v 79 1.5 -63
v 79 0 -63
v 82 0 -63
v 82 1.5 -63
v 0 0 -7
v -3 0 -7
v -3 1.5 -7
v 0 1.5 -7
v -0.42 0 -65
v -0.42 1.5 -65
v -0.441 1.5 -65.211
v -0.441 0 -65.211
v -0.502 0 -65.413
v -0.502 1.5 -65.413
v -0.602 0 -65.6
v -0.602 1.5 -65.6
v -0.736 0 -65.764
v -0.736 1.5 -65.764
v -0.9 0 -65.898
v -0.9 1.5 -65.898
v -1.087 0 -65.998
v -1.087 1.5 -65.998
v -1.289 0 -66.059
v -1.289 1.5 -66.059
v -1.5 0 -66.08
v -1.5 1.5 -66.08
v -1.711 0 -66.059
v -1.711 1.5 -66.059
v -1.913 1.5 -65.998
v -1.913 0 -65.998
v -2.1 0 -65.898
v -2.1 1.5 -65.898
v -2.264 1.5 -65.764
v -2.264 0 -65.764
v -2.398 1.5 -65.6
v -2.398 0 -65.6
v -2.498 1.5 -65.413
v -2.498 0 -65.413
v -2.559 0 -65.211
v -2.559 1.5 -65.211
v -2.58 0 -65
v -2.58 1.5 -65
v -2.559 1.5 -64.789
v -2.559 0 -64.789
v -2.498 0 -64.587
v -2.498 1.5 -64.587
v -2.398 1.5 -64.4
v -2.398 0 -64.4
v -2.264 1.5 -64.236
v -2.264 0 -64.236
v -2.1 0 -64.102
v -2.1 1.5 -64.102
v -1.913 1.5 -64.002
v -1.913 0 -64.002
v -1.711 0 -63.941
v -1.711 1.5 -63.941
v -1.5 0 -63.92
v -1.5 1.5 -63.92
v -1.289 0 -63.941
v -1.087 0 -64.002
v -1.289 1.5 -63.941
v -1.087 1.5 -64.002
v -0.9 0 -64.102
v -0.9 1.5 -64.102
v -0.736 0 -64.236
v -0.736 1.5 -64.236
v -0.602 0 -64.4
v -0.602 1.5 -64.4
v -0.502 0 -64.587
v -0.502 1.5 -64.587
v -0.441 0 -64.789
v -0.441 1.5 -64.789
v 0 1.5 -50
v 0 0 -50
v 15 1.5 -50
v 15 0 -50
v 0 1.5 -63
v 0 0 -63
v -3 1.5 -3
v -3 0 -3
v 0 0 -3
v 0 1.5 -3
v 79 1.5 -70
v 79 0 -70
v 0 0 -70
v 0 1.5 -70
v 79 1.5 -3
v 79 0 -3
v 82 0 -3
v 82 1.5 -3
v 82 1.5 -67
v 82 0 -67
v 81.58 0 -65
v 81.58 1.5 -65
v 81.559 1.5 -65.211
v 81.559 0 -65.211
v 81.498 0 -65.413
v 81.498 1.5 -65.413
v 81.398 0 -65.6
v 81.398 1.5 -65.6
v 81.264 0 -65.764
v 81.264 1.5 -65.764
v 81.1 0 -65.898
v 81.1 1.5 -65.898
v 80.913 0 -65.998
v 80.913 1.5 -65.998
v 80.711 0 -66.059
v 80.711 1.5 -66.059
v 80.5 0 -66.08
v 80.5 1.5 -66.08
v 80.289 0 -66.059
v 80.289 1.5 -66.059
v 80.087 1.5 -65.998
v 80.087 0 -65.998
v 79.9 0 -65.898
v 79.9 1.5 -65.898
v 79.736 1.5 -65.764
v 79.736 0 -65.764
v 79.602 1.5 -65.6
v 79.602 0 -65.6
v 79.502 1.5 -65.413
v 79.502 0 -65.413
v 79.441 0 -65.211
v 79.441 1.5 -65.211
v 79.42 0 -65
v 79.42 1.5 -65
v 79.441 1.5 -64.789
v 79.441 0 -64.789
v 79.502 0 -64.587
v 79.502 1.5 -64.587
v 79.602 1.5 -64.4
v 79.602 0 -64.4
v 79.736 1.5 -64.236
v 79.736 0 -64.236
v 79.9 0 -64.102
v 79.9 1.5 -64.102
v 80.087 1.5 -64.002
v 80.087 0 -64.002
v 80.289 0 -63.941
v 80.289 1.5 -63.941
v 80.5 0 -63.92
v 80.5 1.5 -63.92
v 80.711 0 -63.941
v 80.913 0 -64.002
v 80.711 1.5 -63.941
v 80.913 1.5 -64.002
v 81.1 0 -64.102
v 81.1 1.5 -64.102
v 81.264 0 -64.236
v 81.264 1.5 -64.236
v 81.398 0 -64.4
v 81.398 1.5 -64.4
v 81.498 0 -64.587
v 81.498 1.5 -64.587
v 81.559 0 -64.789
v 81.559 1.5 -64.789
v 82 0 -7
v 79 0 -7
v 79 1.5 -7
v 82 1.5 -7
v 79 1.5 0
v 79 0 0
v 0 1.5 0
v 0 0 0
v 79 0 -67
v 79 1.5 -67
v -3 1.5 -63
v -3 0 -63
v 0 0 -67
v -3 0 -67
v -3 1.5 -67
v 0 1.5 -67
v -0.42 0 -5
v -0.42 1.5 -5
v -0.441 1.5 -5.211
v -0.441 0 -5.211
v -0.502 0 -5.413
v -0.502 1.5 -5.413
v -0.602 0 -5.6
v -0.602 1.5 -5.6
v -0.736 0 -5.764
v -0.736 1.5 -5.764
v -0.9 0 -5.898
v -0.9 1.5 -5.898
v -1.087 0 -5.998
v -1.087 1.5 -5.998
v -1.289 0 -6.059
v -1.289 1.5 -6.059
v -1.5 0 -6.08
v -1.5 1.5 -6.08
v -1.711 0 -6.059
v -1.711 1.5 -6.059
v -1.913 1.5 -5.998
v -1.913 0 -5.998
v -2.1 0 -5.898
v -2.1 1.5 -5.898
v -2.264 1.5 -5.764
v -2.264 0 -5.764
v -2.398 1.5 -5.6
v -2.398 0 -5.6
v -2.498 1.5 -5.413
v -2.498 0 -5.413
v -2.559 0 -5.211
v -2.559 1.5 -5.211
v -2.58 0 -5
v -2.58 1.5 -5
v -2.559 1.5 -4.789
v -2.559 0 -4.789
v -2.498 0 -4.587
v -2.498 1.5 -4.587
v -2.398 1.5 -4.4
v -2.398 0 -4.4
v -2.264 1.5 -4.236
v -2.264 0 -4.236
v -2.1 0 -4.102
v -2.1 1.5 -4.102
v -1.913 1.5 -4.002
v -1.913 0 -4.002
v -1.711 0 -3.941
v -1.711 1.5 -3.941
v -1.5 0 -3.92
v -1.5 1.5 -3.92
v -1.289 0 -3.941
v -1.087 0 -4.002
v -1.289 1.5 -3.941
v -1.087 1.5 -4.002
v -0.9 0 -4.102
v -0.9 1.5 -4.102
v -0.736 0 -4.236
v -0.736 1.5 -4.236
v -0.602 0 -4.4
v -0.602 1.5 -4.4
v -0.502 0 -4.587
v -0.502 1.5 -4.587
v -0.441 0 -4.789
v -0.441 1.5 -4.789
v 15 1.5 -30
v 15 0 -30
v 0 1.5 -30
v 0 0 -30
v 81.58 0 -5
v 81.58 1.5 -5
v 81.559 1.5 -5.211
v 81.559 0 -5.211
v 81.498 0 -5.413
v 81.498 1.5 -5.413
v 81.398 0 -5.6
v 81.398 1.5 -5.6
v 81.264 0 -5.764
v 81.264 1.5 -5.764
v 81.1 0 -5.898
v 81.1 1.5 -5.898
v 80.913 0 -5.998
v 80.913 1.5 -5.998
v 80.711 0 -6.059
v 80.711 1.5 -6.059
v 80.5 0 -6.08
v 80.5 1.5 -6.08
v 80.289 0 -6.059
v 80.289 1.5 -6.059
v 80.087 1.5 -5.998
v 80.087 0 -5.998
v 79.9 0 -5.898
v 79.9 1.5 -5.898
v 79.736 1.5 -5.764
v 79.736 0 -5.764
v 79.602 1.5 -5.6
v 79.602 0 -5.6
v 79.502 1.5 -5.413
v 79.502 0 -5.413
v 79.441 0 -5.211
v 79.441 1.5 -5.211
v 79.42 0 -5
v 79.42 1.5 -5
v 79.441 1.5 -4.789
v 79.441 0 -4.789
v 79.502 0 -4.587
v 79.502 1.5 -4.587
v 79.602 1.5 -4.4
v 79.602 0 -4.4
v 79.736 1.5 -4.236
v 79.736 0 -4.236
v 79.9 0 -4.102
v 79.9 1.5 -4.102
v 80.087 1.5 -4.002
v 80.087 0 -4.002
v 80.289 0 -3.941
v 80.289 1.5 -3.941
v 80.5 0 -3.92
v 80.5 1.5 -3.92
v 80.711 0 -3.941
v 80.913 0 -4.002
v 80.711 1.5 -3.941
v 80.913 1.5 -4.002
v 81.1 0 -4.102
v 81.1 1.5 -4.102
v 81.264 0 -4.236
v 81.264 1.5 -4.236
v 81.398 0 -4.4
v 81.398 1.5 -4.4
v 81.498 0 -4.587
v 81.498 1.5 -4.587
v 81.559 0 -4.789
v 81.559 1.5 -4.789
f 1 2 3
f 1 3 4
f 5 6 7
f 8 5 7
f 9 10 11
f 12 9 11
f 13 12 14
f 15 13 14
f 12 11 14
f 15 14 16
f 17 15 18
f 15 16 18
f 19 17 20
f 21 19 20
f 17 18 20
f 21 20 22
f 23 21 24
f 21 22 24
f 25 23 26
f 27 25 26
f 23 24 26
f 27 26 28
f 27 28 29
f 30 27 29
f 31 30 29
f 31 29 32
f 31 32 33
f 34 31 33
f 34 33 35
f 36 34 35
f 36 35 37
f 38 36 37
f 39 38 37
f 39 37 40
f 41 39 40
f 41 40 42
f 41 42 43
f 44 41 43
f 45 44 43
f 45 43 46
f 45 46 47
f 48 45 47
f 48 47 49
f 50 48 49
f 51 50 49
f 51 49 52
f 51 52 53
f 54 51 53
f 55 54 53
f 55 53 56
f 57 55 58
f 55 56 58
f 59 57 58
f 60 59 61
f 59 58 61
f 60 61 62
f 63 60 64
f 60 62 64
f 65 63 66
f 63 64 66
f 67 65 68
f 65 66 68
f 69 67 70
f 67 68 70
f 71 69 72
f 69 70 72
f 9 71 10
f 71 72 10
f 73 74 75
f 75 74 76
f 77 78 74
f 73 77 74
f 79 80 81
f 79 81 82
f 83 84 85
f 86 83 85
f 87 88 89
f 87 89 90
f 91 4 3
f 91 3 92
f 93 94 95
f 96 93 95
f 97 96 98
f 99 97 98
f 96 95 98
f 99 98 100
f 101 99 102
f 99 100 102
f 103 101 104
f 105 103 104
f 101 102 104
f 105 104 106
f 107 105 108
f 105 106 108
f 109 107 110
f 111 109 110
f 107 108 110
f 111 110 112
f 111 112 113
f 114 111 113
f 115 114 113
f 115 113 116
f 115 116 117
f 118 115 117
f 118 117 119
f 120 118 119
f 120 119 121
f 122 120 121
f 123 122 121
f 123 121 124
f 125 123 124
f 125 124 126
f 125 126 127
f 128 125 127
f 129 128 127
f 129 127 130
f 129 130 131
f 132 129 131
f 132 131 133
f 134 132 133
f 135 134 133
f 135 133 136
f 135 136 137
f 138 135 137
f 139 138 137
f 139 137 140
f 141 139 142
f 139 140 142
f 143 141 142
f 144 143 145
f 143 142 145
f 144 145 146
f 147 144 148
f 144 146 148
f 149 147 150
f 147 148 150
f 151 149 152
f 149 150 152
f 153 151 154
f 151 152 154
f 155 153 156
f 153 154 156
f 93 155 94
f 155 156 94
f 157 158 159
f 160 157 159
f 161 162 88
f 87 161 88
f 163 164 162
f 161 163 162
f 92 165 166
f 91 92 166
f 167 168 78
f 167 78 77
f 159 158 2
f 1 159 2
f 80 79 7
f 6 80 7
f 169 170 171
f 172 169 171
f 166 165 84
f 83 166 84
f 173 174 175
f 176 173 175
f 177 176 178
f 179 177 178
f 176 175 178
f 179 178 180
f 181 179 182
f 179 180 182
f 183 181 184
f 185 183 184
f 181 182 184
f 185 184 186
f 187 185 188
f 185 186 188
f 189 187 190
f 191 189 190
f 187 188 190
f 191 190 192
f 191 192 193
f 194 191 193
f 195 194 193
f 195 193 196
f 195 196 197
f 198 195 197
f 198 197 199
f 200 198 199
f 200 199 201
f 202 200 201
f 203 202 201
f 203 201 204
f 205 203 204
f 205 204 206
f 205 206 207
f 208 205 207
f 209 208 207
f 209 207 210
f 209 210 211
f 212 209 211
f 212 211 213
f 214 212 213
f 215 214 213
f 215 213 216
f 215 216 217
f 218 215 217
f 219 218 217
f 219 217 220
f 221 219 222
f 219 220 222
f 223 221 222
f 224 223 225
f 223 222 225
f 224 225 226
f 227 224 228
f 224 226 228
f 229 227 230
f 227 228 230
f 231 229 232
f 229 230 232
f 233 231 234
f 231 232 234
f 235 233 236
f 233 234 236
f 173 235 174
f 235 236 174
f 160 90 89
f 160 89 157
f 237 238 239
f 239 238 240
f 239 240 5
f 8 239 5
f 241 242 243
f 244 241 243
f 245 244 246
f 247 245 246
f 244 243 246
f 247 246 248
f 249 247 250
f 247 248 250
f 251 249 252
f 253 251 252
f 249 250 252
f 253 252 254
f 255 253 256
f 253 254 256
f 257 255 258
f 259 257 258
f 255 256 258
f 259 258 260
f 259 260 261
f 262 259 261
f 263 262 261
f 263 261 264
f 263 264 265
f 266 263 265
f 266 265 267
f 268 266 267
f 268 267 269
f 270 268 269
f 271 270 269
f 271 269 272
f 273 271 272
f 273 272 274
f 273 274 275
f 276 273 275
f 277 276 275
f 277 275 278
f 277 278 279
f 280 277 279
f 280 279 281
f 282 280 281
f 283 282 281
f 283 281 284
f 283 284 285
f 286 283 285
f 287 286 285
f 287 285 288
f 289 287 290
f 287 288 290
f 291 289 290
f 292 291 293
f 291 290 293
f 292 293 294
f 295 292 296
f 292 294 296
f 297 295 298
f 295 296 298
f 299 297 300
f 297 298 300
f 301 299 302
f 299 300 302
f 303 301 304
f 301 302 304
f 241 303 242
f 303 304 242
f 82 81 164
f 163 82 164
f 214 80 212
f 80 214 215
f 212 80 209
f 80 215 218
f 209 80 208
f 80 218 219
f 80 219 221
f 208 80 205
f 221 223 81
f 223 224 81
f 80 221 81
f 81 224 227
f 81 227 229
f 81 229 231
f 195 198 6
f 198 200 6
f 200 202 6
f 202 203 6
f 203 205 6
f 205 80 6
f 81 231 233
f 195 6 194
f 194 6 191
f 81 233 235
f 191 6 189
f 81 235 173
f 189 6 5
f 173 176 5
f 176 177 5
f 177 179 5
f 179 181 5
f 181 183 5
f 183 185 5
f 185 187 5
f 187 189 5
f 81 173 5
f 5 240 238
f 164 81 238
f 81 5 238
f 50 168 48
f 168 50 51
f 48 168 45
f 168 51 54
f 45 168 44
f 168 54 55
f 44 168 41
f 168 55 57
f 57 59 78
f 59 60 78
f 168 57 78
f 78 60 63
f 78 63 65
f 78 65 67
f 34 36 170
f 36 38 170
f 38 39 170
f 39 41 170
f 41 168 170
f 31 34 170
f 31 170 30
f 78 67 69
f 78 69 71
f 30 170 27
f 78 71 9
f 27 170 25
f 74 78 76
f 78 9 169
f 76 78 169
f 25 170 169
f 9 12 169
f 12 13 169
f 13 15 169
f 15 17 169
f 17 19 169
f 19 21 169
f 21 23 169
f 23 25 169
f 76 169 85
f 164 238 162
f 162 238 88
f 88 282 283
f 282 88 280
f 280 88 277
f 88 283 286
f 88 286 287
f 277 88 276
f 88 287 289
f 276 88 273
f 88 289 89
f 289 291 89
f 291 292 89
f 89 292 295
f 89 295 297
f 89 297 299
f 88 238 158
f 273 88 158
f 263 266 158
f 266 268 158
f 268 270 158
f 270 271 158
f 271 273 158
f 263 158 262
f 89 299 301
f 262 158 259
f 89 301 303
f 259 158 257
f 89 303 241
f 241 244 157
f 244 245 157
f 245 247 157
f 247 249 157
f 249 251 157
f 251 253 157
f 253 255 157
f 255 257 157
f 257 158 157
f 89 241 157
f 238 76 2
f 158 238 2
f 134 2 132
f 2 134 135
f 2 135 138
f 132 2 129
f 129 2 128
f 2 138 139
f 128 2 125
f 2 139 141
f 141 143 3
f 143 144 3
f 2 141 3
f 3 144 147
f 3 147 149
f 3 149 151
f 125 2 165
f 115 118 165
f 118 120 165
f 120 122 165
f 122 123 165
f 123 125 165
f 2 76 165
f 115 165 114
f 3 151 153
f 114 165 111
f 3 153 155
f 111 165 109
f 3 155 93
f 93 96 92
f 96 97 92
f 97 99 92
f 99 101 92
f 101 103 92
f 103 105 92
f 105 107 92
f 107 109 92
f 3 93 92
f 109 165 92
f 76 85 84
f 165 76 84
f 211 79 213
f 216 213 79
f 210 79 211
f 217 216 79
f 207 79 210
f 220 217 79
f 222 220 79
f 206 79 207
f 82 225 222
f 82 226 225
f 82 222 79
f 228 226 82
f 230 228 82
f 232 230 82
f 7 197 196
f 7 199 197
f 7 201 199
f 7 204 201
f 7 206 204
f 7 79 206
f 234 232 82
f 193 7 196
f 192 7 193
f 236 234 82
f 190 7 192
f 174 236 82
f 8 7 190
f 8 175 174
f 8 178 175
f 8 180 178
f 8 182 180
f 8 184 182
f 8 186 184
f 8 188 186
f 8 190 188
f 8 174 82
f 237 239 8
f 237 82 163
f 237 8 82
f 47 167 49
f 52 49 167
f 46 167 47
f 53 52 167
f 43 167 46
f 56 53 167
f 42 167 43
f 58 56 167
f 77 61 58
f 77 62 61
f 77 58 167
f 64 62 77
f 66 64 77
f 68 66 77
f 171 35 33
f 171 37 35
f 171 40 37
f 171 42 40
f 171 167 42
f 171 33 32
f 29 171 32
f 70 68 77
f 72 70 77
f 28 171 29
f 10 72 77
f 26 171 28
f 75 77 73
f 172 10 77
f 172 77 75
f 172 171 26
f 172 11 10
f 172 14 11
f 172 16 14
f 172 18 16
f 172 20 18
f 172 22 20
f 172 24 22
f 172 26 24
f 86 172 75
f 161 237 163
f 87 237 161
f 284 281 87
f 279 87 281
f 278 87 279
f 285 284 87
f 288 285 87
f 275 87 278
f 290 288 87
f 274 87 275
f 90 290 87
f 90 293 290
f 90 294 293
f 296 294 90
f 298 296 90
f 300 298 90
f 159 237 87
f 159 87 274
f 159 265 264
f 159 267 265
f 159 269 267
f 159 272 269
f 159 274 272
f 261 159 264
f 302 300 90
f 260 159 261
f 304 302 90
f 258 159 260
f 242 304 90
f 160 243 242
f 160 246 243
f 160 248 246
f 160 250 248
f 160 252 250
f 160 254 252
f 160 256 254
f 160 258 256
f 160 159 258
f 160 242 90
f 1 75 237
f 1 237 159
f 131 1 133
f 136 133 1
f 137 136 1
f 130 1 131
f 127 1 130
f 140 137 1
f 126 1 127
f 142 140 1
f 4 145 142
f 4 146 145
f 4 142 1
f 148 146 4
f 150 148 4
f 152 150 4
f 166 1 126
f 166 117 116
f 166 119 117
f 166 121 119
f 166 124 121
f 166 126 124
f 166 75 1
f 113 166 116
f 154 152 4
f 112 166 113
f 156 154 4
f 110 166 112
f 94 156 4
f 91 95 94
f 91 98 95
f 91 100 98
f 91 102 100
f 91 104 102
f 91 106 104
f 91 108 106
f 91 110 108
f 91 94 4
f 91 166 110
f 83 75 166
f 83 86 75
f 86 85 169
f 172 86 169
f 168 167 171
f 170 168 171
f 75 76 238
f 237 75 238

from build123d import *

# Parameters (mm, degrees)
BOSS_EXTRUDE1_DEPTH  = 1.5
SKETCH3_W            = 4
SKETCH3_H            = 1.5
BOSS_EXTRUDE2_DEPTH  = 3
SKETCH4_R            = 1.08
CUT_EXTRUDE1_DEPTH   = 2.5
LPATTERN1_COUNT      = 2
LPATTERN1_PITCH      = 60
LPATTERN1_COUNT_DIR2 = 2
LPATTERN1_PITCH_DIR2 = 82
LPATTERN2_COUNT      = 2
LPATTERN2_PITCH      = 60
LPATTERN2_COUNT_DIR2 = 2
LPATTERN2_PITCH_DIR2 = 82


with BuildPart() as part:
    # Sketch2 → Boss-Extrude1 (new body)
    with BuildSketch(Plane(origin=(0, 0, 0), x_dir=(1, 0, 0), z_dir=(0, 1, 0))):
        Polygon((0, 0), (79, 0), (79, 70), (0, 70), (0, 50), (15, 50), (15, 30), (0, 30), align=None)
    extrude(amount=BOSS_EXTRUDE1_DEPTH)

    # Sketch3 → Boss-Extrude2 (add)
    with BuildSketch(Plane(origin=(79, 0, 0), x_dir=(0, 0, -1), z_dir=(1, 0, 0))):
        with Locations((5, 0.75)):
            Rectangle(SKETCH3_W, SKETCH3_H)
    boss_extrude2 = extrude(amount=BOSS_EXTRUDE2_DEPTH)

    # Sketch4 → Cut-Extrude1 (cut, through all)
    with BuildSketch(Plane(origin=(0, 1.5, 0), x_dir=(1, 0, 0), z_dir=(0, 1, 0))):
        with Locations((80.5, 5)):
            Circle(SKETCH4_R)
    cut_extrude1 = extrude(amount=-CUT_EXTRUDE1_DEPTH, mode=Mode.SUBTRACT)

    # LPattern1: Boss-Extrude2 2 × 2
    with Locations(*[(-j * LPATTERN1_PITCH_DIR2, 0, -i * LPATTERN1_PITCH) for i in range(LPATTERN1_COUNT) for j in range(LPATTERN1_COUNT_DIR2) if (i, j) != (0, 0)]):
        add(boss_extrude2)

    # LPattern2: Cut-Extrude1 2 × 2
    with Locations(*[(-j * LPATTERN2_PITCH_DIR2, 0, -i * LPATTERN2_PITCH) for i in range(LPATTERN2_COUNT) for j in range(LPATTERN2_COUNT_DIR2) if (i, j) != (0, 0)]):
        add(cut_extrude1, mode=Mode.SUBTRACT)


solid = part.part
